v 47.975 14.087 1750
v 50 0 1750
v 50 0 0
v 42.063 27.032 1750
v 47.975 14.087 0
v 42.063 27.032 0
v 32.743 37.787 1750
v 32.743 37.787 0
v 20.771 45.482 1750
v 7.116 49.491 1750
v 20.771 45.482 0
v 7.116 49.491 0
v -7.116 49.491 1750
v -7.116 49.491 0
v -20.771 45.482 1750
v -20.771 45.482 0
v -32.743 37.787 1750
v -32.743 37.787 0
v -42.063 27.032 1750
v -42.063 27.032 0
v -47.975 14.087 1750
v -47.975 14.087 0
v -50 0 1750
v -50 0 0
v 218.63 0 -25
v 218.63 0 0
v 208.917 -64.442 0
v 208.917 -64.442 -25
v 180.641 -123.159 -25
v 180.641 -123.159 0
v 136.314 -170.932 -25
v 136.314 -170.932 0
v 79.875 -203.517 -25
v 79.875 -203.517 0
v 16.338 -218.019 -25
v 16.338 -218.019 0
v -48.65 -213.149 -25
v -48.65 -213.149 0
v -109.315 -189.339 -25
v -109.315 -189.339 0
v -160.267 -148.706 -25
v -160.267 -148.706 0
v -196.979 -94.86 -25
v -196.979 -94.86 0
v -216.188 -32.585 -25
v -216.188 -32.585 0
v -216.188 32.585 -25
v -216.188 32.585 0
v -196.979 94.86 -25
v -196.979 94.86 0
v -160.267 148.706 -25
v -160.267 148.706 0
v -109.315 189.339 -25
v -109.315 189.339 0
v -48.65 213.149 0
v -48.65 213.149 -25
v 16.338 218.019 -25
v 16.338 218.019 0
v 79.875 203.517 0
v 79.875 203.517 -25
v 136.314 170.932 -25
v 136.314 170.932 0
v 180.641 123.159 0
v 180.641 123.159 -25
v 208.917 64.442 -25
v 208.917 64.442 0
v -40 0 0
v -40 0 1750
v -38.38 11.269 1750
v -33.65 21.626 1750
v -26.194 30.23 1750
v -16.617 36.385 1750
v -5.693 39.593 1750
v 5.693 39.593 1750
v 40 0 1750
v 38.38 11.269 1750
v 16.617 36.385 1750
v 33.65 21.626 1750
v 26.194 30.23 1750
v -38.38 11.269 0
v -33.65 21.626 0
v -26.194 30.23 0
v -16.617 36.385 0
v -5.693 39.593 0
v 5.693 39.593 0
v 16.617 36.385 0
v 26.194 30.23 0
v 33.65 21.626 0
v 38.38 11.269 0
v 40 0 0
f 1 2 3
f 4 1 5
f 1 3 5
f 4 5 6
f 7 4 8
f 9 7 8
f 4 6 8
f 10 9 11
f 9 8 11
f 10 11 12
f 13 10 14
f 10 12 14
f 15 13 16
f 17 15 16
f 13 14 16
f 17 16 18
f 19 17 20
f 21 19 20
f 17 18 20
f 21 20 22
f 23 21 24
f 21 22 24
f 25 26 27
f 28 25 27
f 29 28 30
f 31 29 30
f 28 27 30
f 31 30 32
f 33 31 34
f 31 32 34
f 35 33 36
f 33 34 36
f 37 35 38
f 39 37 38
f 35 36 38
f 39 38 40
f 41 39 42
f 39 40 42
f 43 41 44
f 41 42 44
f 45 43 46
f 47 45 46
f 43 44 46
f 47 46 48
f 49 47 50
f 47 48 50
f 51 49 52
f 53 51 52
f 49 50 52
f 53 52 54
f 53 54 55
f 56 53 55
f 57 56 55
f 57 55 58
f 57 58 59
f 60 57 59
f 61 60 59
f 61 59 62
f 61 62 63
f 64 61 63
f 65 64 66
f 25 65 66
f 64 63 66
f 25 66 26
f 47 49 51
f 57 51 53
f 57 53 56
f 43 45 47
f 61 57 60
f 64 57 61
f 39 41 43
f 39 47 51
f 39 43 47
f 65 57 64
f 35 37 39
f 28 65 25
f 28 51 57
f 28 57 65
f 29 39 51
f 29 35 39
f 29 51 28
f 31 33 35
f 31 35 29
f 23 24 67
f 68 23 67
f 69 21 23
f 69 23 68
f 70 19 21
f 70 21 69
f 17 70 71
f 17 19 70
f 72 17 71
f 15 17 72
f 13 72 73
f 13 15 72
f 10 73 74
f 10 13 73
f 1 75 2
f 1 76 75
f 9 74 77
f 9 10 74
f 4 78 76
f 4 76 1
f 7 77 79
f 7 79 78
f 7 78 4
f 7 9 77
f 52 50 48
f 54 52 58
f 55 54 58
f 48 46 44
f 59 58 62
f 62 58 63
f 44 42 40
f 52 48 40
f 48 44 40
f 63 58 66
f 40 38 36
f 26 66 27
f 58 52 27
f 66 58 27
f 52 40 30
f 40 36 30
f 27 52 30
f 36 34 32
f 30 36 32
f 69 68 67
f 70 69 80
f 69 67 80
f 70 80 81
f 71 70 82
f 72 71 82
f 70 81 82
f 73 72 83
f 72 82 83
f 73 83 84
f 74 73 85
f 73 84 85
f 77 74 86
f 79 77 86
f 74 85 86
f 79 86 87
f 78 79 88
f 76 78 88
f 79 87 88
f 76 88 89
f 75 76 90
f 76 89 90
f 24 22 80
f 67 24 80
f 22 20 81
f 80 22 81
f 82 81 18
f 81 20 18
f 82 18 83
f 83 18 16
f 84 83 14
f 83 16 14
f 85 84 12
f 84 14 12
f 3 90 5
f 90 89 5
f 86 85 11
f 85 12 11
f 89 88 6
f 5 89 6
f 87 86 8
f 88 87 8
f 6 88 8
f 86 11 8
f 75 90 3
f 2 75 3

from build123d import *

# Parameters (mm, degrees)
F1_DEPTH = 1750
F2_R     = 218.630167
F3_DEPTH = 25


with BuildPart() as f1:
    # F0 (on Top) → F1 (new body)
    with BuildSketch(Plane.XY):
        with BuildLine():
            Line((40, 0), (50, 0))
            ThreePointArc((50, 0), (0, 50), (-50, 0))
            Line((-50, 0), (-40, 0))
            ThreePointArc((-40, 0), (0, 40), (40, 0))
        make_face()
    extrude(amount=F1_DEPTH)


with BuildPart() as f3:
    # F2 (on face) → F3 (new body)
    with BuildSketch(Plane(origin=(0, 0, 0), x_dir=(1, 0, 0), z_dir=(0, 0, -1))):
        Circle(F2_R)
    extrude(amount=F3_DEPTH)


solid = Compound([f1.part, f3.part])
